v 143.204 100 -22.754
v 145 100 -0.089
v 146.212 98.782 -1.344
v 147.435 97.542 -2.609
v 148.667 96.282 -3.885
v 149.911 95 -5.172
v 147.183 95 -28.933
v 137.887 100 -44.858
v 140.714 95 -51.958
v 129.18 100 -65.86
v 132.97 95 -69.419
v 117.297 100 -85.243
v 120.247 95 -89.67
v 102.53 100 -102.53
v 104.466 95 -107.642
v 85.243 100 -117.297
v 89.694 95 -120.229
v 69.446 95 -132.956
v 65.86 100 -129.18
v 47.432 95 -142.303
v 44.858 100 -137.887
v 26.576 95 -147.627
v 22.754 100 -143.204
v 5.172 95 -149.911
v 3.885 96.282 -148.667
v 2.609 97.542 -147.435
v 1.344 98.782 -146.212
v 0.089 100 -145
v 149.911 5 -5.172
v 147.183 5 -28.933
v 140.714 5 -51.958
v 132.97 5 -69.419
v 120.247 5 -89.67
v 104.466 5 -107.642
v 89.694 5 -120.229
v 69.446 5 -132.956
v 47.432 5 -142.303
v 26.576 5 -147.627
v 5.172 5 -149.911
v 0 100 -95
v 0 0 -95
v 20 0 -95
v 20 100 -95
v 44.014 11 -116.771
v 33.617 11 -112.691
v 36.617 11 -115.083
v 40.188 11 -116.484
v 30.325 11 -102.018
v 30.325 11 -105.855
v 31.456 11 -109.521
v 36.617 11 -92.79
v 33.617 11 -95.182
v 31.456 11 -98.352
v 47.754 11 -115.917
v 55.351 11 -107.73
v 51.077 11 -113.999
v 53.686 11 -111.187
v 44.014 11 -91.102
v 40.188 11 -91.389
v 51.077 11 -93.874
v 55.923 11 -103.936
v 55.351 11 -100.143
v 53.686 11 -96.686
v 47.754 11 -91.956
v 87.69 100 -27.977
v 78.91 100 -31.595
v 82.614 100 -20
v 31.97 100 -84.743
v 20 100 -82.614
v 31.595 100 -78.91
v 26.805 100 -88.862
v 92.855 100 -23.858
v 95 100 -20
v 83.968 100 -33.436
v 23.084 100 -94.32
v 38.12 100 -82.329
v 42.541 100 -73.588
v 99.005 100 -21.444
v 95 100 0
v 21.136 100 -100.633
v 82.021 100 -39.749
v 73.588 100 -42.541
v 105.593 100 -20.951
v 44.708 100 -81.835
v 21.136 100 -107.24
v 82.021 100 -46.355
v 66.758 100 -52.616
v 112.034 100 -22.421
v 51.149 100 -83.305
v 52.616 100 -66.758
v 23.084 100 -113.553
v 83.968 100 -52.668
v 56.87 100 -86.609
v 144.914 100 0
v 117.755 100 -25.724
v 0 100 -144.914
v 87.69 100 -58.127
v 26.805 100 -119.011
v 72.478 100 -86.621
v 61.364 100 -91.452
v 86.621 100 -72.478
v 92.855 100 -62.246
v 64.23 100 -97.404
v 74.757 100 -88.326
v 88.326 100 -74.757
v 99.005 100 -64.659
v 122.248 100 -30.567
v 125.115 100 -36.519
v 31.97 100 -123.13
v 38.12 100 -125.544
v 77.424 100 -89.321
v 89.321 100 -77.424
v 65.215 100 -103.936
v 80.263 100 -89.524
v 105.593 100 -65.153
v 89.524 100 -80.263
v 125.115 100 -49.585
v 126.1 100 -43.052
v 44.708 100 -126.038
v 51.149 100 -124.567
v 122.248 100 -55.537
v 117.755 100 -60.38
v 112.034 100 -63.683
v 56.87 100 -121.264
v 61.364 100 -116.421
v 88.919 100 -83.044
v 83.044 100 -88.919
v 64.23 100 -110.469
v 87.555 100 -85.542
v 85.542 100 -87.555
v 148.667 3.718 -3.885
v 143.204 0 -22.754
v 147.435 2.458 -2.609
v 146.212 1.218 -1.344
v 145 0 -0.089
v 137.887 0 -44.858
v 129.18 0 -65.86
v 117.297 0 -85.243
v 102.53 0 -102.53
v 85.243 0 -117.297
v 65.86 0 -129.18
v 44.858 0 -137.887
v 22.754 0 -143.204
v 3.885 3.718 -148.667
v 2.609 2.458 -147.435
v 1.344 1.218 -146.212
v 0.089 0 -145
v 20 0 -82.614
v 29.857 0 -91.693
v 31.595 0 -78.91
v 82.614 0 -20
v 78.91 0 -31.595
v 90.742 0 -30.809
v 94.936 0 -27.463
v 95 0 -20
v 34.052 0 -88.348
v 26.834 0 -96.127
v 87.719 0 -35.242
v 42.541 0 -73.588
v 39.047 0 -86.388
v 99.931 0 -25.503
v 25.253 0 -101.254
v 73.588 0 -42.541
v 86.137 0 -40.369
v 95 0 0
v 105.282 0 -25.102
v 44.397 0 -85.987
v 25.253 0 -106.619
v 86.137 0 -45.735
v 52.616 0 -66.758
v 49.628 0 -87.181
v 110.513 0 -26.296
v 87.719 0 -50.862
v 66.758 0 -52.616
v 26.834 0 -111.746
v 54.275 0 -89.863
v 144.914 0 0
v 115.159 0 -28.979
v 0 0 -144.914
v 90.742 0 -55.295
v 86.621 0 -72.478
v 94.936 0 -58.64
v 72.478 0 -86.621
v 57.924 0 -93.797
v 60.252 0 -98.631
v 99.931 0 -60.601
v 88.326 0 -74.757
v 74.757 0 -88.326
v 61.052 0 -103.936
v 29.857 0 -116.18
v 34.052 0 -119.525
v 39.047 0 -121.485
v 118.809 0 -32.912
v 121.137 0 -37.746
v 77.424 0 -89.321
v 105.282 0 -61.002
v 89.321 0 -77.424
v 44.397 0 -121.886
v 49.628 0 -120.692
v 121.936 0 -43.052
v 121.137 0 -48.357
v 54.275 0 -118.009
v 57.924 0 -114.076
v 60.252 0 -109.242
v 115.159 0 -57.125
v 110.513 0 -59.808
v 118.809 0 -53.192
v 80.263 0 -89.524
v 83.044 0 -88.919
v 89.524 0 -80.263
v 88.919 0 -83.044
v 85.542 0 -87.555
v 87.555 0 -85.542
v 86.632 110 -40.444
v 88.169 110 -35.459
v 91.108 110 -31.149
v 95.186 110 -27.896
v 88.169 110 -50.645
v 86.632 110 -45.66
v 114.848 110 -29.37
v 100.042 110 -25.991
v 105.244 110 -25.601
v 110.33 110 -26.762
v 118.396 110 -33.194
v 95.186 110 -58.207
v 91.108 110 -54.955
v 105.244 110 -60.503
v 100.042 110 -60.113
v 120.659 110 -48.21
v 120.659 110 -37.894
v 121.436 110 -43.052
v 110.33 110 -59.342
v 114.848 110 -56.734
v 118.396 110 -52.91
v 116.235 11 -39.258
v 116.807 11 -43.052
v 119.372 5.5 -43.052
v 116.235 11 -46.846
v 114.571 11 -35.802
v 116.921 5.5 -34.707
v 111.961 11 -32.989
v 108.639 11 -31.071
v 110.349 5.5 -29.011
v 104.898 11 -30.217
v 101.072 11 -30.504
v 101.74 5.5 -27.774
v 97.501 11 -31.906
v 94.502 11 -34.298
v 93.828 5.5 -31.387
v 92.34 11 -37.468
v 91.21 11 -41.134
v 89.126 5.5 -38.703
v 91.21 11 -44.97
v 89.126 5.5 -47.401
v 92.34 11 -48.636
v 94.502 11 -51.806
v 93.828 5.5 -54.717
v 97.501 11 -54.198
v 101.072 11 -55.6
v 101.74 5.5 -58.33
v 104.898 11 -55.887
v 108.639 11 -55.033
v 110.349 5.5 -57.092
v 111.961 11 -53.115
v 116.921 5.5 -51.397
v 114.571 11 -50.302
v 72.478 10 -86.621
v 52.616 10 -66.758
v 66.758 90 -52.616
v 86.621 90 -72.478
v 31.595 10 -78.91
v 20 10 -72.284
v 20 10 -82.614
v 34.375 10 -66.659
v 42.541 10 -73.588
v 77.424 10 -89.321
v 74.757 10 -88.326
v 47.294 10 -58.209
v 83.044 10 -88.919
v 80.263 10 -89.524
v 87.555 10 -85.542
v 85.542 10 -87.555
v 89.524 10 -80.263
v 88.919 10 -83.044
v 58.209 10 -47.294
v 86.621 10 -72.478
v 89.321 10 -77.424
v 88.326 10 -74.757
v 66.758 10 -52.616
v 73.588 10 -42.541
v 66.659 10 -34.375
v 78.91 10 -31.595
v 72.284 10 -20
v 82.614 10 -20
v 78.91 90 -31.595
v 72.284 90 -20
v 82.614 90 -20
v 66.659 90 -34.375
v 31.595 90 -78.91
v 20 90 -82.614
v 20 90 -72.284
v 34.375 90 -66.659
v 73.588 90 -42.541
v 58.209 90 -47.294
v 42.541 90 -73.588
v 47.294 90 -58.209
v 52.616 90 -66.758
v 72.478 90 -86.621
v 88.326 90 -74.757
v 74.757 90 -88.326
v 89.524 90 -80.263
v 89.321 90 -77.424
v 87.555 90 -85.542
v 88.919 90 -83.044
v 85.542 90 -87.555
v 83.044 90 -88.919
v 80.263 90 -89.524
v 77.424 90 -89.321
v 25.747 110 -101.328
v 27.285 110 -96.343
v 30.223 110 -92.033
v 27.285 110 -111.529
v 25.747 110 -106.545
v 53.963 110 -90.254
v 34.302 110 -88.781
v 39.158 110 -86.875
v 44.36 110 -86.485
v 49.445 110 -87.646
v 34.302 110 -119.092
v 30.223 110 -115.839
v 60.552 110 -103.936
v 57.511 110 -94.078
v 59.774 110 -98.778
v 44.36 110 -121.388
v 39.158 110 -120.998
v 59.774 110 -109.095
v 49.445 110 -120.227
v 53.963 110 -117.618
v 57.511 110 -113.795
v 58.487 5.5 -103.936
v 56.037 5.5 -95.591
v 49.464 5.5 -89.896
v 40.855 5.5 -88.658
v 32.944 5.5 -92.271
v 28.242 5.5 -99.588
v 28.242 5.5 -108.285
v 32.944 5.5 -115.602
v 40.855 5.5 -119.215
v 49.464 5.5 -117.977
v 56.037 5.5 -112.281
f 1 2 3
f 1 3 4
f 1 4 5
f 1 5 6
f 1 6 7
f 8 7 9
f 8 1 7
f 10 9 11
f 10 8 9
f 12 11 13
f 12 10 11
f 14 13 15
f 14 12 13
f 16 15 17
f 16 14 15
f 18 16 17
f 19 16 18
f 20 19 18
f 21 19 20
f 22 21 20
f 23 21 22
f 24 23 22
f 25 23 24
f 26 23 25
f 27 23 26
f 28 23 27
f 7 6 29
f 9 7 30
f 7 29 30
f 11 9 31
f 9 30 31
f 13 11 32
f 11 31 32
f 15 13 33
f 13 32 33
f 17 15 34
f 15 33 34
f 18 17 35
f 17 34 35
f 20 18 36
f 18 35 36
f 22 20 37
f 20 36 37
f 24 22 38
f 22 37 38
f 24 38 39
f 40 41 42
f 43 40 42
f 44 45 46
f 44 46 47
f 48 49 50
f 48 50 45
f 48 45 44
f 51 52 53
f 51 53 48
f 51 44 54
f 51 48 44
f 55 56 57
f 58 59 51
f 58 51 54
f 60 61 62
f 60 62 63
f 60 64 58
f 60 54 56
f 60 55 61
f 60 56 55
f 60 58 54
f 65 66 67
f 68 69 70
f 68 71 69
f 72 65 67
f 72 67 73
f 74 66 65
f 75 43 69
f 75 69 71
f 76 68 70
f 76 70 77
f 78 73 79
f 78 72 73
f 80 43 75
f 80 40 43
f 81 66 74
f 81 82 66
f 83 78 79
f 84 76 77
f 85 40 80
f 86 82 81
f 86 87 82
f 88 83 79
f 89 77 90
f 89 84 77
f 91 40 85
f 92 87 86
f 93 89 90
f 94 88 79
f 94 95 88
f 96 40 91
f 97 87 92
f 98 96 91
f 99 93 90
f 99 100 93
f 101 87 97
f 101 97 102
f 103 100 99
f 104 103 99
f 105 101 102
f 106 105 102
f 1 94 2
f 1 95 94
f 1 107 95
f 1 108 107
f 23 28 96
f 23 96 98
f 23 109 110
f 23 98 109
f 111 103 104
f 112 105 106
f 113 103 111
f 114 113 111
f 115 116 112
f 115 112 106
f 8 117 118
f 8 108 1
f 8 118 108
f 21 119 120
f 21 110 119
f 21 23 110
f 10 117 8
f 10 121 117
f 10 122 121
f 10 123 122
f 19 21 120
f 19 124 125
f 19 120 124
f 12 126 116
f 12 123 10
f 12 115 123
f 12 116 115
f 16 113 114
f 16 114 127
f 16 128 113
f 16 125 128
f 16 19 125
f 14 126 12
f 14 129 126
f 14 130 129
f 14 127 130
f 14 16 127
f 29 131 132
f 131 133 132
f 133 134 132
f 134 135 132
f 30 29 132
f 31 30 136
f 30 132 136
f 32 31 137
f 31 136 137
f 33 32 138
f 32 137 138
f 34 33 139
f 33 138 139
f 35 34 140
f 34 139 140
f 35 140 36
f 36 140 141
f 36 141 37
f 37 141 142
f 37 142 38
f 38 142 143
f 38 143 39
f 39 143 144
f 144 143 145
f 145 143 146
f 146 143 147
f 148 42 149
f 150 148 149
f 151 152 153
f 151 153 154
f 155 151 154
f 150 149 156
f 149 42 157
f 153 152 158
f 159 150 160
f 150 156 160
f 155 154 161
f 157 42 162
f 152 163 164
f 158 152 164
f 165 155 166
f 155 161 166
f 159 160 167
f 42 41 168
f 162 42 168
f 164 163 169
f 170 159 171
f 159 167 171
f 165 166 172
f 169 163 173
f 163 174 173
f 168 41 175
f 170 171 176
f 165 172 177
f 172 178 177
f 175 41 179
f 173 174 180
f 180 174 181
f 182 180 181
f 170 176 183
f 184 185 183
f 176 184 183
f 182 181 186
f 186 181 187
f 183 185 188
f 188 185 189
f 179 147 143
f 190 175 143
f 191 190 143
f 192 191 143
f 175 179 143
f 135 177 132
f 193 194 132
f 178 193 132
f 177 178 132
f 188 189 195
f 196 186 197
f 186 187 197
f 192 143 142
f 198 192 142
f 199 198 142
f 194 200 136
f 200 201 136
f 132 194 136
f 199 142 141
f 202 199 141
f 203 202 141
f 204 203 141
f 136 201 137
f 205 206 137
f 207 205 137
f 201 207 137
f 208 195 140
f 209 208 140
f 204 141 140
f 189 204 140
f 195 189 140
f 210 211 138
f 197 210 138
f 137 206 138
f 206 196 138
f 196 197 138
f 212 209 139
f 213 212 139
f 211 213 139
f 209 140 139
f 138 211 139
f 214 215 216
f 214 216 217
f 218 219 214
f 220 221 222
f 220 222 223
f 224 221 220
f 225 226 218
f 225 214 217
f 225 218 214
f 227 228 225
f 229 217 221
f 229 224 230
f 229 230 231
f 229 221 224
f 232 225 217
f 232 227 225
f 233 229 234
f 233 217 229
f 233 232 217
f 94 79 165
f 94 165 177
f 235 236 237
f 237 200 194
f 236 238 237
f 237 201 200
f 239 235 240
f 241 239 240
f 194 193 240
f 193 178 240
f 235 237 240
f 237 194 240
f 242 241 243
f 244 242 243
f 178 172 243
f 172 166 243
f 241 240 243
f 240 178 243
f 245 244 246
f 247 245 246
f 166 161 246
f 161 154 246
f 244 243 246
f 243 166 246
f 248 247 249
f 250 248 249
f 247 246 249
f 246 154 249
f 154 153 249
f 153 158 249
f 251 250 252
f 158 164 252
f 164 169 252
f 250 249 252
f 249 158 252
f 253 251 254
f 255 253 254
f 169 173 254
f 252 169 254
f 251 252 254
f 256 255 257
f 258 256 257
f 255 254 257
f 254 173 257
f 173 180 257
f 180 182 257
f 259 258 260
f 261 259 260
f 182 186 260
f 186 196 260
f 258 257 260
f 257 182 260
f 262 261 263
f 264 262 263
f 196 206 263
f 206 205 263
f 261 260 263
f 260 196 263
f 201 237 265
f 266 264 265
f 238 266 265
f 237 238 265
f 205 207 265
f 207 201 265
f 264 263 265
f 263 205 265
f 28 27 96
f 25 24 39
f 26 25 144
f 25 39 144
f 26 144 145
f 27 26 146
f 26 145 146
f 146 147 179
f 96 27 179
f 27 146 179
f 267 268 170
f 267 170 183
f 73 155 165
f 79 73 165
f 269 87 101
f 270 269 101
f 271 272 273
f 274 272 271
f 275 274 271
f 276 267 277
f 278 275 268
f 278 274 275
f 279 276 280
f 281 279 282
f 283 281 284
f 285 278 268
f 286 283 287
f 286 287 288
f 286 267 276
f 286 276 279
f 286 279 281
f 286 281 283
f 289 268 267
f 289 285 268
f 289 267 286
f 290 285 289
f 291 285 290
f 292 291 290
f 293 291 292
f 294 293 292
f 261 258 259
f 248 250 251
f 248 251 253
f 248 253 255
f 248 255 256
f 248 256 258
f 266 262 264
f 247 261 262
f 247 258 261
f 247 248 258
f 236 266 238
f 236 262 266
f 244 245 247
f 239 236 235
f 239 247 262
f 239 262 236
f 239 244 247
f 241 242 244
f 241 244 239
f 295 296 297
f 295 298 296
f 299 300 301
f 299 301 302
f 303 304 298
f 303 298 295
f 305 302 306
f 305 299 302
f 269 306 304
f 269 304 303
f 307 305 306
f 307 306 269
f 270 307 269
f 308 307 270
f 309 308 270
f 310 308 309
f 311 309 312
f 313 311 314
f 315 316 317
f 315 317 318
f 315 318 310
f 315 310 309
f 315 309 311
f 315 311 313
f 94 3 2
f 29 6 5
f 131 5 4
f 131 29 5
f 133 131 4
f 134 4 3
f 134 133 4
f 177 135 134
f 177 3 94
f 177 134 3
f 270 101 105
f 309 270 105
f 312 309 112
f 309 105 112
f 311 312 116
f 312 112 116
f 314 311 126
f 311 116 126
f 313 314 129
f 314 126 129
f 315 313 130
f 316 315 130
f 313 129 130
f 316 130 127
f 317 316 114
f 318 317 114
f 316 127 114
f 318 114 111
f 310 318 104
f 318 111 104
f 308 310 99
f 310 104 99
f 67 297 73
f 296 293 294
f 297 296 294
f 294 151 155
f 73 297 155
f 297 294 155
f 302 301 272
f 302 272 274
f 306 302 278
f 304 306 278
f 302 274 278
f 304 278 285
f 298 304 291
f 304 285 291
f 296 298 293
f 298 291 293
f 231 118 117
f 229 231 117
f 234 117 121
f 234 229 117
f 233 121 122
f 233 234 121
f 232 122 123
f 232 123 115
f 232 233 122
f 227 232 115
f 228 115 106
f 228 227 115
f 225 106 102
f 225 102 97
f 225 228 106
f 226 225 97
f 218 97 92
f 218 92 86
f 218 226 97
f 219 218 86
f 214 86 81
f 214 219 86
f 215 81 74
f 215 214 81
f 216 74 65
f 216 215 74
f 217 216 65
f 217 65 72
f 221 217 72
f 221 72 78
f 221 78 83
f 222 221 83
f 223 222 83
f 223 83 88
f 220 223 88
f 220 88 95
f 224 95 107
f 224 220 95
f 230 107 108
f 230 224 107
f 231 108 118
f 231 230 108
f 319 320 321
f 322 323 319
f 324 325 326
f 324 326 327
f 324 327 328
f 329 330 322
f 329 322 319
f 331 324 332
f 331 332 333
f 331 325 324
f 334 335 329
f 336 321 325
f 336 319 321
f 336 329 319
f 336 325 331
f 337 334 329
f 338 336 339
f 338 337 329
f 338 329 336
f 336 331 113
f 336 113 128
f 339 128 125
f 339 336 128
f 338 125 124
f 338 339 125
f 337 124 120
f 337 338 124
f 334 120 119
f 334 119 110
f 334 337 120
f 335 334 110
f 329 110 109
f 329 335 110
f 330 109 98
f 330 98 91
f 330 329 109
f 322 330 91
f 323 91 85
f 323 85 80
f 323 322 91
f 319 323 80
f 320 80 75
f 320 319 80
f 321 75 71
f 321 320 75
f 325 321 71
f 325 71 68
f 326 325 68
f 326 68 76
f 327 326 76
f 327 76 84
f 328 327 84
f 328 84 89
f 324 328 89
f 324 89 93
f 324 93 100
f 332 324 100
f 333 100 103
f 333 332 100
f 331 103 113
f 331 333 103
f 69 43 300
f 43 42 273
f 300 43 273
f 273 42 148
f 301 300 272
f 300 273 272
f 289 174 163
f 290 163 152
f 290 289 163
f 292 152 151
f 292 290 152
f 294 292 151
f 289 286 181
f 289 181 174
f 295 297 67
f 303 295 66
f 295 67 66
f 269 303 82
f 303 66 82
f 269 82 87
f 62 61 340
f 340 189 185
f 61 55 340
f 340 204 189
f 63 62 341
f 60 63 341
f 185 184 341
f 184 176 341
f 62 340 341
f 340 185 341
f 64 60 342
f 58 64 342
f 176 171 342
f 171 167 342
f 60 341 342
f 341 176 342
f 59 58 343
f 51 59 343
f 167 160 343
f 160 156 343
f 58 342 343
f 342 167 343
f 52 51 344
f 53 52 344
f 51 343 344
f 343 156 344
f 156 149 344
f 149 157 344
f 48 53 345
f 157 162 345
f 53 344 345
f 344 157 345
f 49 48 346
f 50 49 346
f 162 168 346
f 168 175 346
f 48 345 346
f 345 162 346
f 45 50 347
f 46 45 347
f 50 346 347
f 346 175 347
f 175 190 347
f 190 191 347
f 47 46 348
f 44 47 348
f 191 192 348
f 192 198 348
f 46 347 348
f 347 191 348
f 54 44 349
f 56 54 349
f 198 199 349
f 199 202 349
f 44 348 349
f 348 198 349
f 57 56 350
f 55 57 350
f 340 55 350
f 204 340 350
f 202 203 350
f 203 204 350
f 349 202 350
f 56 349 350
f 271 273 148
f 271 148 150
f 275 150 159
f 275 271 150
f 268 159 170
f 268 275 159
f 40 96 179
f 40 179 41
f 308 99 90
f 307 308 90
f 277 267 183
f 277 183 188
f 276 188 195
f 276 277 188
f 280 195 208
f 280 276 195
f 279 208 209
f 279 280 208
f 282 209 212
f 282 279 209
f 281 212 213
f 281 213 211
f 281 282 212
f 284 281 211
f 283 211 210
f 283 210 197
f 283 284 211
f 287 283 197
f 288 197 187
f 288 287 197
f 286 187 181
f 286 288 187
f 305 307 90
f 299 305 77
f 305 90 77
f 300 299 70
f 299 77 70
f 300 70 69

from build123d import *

# Parameters (mm, degrees)
BOSS_EXTRUDE1_DEPTH           = 100
SKETCH3_R                     = 17.5
BOSS_EXTRUDE3_DEPTH           = 10
BOSS_EXTRUDE3_DRAFT           = 25
BOSS_EXTRUDE3_PROFILE_2_DEPTH = 10
BOSS_EXTRUDE3_PROFILE_2_DRAFT = 25
SKETCH4_R                     = 18
CUT_EXTRUDE1_DEPTH            = 11
CUT_EXTRUDE1_DRAFT            = -25
CUT_EXTRUDE1_PROFILE_2_DEPTH  = 11
CUT_EXTRUDE1_PROFILE_2_DRAFT  = -25
SKETCH5_W                     = 40
SKETCH5_H                     = 40
CUT_EXTRUDE2_DEPTH            = 144
SKETCH6_R                     = 85
CUT_EXTRUDE3_DEPTH            = 10
CUT_EXTRUDE4_START            = -10
SKETCH7_R                     = 85
CUT_EXTRUDE4_DEPTH            = 10
CUT_EXTRUDE5_DEPTH            = 10
CUT_EXTRUDE6_START            = -10
CUT_EXTRUDE6_DEPTH            = 10


with BuildPart() as part:
    # Sketch1 → Boss-Extrude1 (new body)
    with BuildSketch(Plane(origin=(0, 0, 0), x_dir=(1, 0, 0), z_dir=(0, 1, 0))):
        with BuildLine():
            Line((0, 150), (0, 75))
            ThreePointArc((0, 75), (53.033008589, 53.033008589), (75, 0))
            Line((75, 0), (150, 0))
            ThreePointArc((150, 0), (106.066017178, 106.066017178), (0, 150))
        make_face()
    extrude(amount=BOSS_EXTRUDE1_DEPTH)


with BuildPart() as boss_extrude3_tool:
    # Sketch3 → Boss-Extrude3 (with draft: the straight prism first)
    with BuildSketch(Plane(origin=(0, 110, 0), x_dir=(1, 0, 0), z_dir=(0, 1, 0))):
        with Locations((43.051886141, 103.936447408)):
            Circle(SKETCH3_R)
    extrude(amount=-BOSS_EXTRUDE3_DEPTH)
    # Boss-Extrude3: the draft: its side faces are tilted about the plane it starts from
    boss_extrude3_sides = [boss_extrude3_tool.faces().sort_by_distance(p)[0] for p in [
        (25.551886141, 105, -103.936447408),
    ]]
    draft(boss_extrude3_sides, Plane(origin=(0, 110, 0), x_dir=(1, 0, 0), z_dir=(0, 1, 0)), BOSS_EXTRUDE3_DRAFT)


with BuildPart() as part_1:
    add(part.part)

    # Boss-Extrude3: add boss_extrude3_tool
    add(boss_extrude3_tool.part)


with BuildPart() as boss_extrude3_profile_2_tool:
    # Sketch3 → Boss-Extrude3 profile 2 (with draft: the straight prism first)
    with BuildSketch(Plane(origin=(0, 110, 0), x_dir=(1, 0, 0), z_dir=(0, 1, 0))):
        with Locations((103.936447408, 43.051886141)):
            Circle(SKETCH3_R)
    extrude(amount=-BOSS_EXTRUDE3_PROFILE_2_DEPTH)
    # Boss-Extrude3 profile 2: the draft: its side faces are tilted about the plane it starts from
    boss_extrude3_profile_2_sides = [boss_extrude3_profile_2_tool.faces().sort_by_distance(p)[0] for p in [
        (86.436447408, 105, -43.051886141),
    ]]
    draft(boss_extrude3_profile_2_sides, Plane(origin=(0, 110, 0), x_dir=(1, 0, 0), z_dir=(0, 1, 0)), BOSS_EXTRUDE3_PROFILE_2_DRAFT)


with BuildPart() as part_2:
    add(part_1.part)

    # Boss-Extrude3 profile 2: add boss_extrude3_profile_2_tool
    add(boss_extrude3_profile_2_tool.part)


with BuildPart() as cut_extrude1_tool:
    # Sketch4 → Cut-Extrude1 (with draft: the straight prism first)
    with BuildSketch(Plane.XZ):
        with Locations((103.936447408, -43.051886141)):
            Circle(SKETCH4_R)
    extrude(amount=-CUT_EXTRUDE1_DEPTH)
    # Cut-Extrude1: the draft: its side faces are tilted about the plane it starts from
    cut_extrude1_sides = [cut_extrude1_tool.faces().sort_by_distance(p)[0] for p in [
        (85.936447408, 5.5, -43.051886141),
    ]]
    draft(cut_extrude1_sides, Plane.XZ, CUT_EXTRUDE1_DRAFT)


with BuildPart() as part_3:
    add(part_2.part)

    # Cut-Extrude1: cut by cut_extrude1_tool
    add(cut_extrude1_tool.part, mode=Mode.SUBTRACT)


with BuildPart() as cut_extrude1_profile_2_tool:
    # Sketch4 → Cut-Extrude1 profile 2 (with draft: the straight prism first)
    with BuildSketch(Plane.XZ):
        with Locations((43.051886141, -103.936447408)):
            Circle(SKETCH4_R)
    extrude(amount=-CUT_EXTRUDE1_PROFILE_2_DEPTH)
    # Cut-Extrude1 profile 2: the draft: its side faces are tilted about the plane it starts from
    cut_extrude1_profile_2_sides = [cut_extrude1_profile_2_tool.faces().sort_by_distance(p)[0] for p in [
        (25.051886141, 5.5, -103.936447408),
    ]]
    draft(cut_extrude1_profile_2_sides, Plane.XZ, CUT_EXTRUDE1_PROFILE_2_DRAFT)


with BuildPart() as part_4:
    add(part_3.part)

    # Cut-Extrude1 profile 2: cut by cut_extrude1_profile_2_tool
    add(cut_extrude1_profile_2_tool.part, mode=Mode.SUBTRACT)

    # Sketch5 → Cut-Extrude2 (cut)
    with BuildSketch(Plane.XZ):
        with Locations((0, -75)):
            Rectangle(SKETCH5_W, SKETCH5_H)
        with Locations((75, 0)):
            Rectangle(SKETCH5_W, SKETCH5_H)
    extrude(amount=-CUT_EXTRUDE2_DEPTH, mode=Mode.SUBTRACT)

    # Chamfer1
    # the kernel refuses this chamfer: 5 mm, written as the material it takes off along each edge
    with BuildSketch(Plane(origin=(0, 100, 0), x_dir=(0.9963251041879452, 0, 0.08565212644692502), z_dir=(-0.08565212644692502, 0, 0.9963251041879452))) as chamfer1_piece_1:
        with BuildLine():
            Line((150.141421356, -5.141421356), (144.858578644, 0.141421356))
            Line((144.858578644, 0.141421356), (144.858578644, 0.241421356))
            ThreePointArc((144.858578644, 0.241421356), (147.429289322, 0.1), (150, 0.1))
            Line((150, 0.1), (150.1, 0))
            ThreePointArc((150.1, 0), (150.1, -2.570710678), (150.241421356, -5.141421356))
            Line((150.241421356, -5.141421356), (150.141421356, -5.141421356))
        make_face()
    revolve(axis=Axis((0, 100, 0), (0, 1, 0)), revolution_arc=99.827051452, mode=Mode.SUBTRACT)
    with BuildSketch(Plane(origin=(0, 0, 0), x_dir=(0.9963251041879452, 0, 0.08565212644692488), z_dir=(-0.08565212644692488, 0, 0.9963251041879452))) as chamfer1_piece_2:
        with BuildLine():
            Line((150.141421356, 5.141421356), (144.858578644, -0.141421356))
            Line((144.858578644, -0.141421356), (144.858578644, -0.241421356))
            ThreePointArc((144.858578644, -0.241421356), (147.429289322, -0.1), (150, -0.1))
            Line((150, -0.1), (150.1, 0))
            ThreePointArc((150.1, 0), (150.1, 2.570710678), (150.241421356, 5.141421356))
            Line((150.241421356, 5.141421356), (150.141421356, 5.141421356))
        make_face()
    revolve(axis=Axis((0, 0, 0), (0, 1, 0)), revolution_arc=99.827051452, mode=Mode.SUBTRACT)
    with BuildSketch(Plane(origin=(150, -13.291214034, 0), x_dir=(0.009358737420086232, 0, -0.9999562060579963), z_dir=(0, 1, 0))) as chamfer1_piece_3:
        with BuildLine():
            Line((5.316485613, 0), (-0.192733912, 5.223619222))
            Line((-0.192733912, 5.223619222), (-0.292729532, 5.222683348))
            ThreePointArc((-0.292729532, 5.222683348), (-0.124446231, 2.611546813), (-0.099995621, -0.000935874))
            Line((-0.099995621, -0.000935874), (0.000935874, -0.099995621))
            ThreePointArc((0.000935874, -0.099995621), (2.659639048, -0.051556934), (5.320869055, -0.099903881))
            Line((5.320869055, -0.099903881), (5.316485613, 0))
        make_face()
    extrude(amount=126.582428067, mode=Mode.SUBTRACT)
    with BuildSketch(Plane(origin=(0, -13.291214034, -150), x_dir=(0.9999562060579963, 0, -0.009358737420086213), z_dir=(0, 1, 0))) as chamfer1_piece_4:
        with BuildLine():
            Line((5.316485613, 0), (-0.192733912, -5.223619222))
            Line((-0.192733912, -5.223619222), (-0.292729532, -5.222683348))
            ThreePointArc((-0.292729532, -5.222683348), (-0.124446231, -2.611546813), (-0.099995621, 0.000935874))
            Line((-0.099995621, 0.000935874), (0.000935874, 0.099995621))
            ThreePointArc((0.000935874, 0.099995621), (2.659639048, 0.051556934), (5.320869055, 0.099903881))
            Line((5.320869055, 0.099903881), (5.316485613, 0))
        make_face()
    extrude(amount=126.582428067, mode=Mode.SUBTRACT)

    # Sketch6 → Cut-Extrude3 (cut)
    with BuildSketch(Plane(origin=(0, 100, 0), x_dir=(1, 0, 0), z_dir=(0, 1, 0))):
        Circle(SKETCH6_R)
    extrude(amount=-CUT_EXTRUDE3_DEPTH, mode=Mode.SUBTRACT)

    # Sketch7 → Cut-Extrude4 (cut)
    with BuildSketch(Plane.XZ.offset(CUT_EXTRUDE4_START)):
        Circle(SKETCH7_R)
    extrude(amount=CUT_EXTRUDE4_DEPTH, mode=Mode.SUBTRACT)

    # Sketch8 → Cut-Extrude5 (cut)
    with BuildSketch(Plane(origin=(0, 100, 0), x_dir=(1, 0, 0), z_dir=(0, 1, 0))):
        with BuildLine():
            Line((66.757749743, 52.61561412), (86.620580695, 72.478445072))
            ThreePointArc((86.620580695, 72.478445072), (86.620580695, 86.620580695), (72.478445072, 86.620580695))
            Line((72.478445072, 86.620580695), (52.61561412, 66.757749743))
            ThreePointArc((52.61561412, 66.757749743), (60.104076401, 60.104076401), (66.757749743, 52.61561412))
        make_face()
    extrude(amount=-CUT_EXTRUDE5_DEPTH, mode=Mode.SUBTRACT)

    # Sketch10 → Cut-Extrude6 (cut)
    with BuildSketch(Plane.XZ.offset(CUT_EXTRUDE6_START)):
        with BuildLine():
            Line((86.620580695, -72.478445072), (66.757749743, -52.61561412))
            ThreePointArc((66.757749743, -52.61561412), (60.104076401, -60.104076401), (52.61561412, -66.757749743))
            Line((52.61561412, -66.757749743), (72.478445072, -86.620580695))
            ThreePointArc((72.478445072, -86.620580695), (86.620580695, -86.620580695), (86.620580695, -72.478445072))
        make_face()
    extrude(amount=CUT_EXTRUDE6_DEPTH, mode=Mode.SUBTRACT)


solid = part_4.part
